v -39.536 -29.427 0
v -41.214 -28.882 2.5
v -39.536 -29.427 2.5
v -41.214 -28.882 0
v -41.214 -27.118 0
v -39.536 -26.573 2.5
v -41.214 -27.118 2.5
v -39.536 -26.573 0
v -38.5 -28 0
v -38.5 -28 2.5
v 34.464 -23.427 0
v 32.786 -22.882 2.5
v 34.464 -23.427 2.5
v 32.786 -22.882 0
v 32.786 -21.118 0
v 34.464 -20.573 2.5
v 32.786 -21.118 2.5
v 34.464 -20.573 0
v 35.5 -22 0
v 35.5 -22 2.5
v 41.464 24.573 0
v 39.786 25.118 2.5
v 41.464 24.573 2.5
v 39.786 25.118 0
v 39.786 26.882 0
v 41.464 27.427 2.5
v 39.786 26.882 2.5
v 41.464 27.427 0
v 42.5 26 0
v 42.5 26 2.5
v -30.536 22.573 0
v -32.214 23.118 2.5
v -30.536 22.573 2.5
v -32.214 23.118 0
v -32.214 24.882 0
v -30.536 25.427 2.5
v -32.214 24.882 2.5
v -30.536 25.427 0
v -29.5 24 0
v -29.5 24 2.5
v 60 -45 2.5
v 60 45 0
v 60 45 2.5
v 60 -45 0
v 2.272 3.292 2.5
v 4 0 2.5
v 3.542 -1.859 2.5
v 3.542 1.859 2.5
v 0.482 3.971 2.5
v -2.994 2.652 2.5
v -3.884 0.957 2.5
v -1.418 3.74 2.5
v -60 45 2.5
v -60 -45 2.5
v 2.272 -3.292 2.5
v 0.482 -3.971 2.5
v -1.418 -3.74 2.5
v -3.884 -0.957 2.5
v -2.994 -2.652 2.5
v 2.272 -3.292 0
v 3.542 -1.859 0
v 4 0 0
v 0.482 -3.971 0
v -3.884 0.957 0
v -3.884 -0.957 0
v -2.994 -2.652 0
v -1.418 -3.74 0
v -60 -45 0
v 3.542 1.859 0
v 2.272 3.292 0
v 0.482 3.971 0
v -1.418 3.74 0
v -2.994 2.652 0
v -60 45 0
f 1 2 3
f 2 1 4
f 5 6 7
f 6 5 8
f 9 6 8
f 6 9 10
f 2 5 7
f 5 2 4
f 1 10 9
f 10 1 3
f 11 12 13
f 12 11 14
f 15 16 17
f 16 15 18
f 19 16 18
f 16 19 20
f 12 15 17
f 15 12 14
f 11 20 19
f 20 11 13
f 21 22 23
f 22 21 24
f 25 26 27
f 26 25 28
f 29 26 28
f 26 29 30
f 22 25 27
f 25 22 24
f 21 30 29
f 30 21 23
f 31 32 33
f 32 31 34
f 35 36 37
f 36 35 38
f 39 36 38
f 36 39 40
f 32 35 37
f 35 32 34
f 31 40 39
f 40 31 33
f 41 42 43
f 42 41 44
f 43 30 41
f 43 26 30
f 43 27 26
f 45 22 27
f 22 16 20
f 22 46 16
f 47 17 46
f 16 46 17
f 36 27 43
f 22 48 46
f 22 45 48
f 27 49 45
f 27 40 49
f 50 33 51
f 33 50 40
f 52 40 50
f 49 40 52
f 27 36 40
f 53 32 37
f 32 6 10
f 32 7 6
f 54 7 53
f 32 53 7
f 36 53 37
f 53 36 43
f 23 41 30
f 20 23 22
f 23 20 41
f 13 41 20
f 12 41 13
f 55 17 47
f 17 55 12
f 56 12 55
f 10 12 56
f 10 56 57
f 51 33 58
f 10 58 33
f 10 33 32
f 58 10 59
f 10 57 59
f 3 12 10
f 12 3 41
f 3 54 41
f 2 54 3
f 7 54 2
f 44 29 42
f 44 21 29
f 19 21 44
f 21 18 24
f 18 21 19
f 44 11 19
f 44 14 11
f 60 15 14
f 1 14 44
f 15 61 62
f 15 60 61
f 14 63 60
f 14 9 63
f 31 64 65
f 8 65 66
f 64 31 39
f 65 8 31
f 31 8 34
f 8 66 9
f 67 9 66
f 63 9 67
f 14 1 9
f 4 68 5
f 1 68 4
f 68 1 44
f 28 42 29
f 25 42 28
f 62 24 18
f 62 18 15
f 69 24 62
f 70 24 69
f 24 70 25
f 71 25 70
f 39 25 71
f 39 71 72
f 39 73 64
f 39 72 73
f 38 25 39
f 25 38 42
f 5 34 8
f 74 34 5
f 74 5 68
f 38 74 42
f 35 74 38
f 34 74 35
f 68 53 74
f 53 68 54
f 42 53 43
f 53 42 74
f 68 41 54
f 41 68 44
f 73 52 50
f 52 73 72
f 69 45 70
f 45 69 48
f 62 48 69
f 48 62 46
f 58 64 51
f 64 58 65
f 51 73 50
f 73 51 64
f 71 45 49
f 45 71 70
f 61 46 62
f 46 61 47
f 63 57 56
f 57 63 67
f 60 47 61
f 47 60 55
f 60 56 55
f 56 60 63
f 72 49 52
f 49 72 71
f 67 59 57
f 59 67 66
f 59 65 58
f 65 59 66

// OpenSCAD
// part_id: sp3
// name: SP3 superior plate
// source_drawing_ids: DRW-056;DRW-022
// units: mm
// revision: 0.1-placeholder
// SPDX-License-Identifier: MIT

module part_sp3(width = 120, depth = 90, thickness = 2.5, drive_bore_d = 8, mount_bore_d = 3) {
    difference() {
        translate([-width / 2, -depth / 2, 0]) cube([width, depth, thickness], center = false);

        // Center drive-shaft hole.
        translate([0, 0, -0.1]) cylinder(d = drive_bore_d, h = thickness + 0.2, center = false);

        // Intentionally uneven mount pattern from section 8.11.5 text.
        for (p = [[-40, -28], [34, -22], [41, 26], [-31, 24]]) {
            translate([p[0], p[1], -0.1]) cylinder(d = mount_bore_d, h = thickness + 0.2, center = false);
        }
    }
}


// ---- "main guard" ----
// Default to previewing when opened directly:
if (is_undef(__LIB_MODE__)) {
    part_sp3();
}
